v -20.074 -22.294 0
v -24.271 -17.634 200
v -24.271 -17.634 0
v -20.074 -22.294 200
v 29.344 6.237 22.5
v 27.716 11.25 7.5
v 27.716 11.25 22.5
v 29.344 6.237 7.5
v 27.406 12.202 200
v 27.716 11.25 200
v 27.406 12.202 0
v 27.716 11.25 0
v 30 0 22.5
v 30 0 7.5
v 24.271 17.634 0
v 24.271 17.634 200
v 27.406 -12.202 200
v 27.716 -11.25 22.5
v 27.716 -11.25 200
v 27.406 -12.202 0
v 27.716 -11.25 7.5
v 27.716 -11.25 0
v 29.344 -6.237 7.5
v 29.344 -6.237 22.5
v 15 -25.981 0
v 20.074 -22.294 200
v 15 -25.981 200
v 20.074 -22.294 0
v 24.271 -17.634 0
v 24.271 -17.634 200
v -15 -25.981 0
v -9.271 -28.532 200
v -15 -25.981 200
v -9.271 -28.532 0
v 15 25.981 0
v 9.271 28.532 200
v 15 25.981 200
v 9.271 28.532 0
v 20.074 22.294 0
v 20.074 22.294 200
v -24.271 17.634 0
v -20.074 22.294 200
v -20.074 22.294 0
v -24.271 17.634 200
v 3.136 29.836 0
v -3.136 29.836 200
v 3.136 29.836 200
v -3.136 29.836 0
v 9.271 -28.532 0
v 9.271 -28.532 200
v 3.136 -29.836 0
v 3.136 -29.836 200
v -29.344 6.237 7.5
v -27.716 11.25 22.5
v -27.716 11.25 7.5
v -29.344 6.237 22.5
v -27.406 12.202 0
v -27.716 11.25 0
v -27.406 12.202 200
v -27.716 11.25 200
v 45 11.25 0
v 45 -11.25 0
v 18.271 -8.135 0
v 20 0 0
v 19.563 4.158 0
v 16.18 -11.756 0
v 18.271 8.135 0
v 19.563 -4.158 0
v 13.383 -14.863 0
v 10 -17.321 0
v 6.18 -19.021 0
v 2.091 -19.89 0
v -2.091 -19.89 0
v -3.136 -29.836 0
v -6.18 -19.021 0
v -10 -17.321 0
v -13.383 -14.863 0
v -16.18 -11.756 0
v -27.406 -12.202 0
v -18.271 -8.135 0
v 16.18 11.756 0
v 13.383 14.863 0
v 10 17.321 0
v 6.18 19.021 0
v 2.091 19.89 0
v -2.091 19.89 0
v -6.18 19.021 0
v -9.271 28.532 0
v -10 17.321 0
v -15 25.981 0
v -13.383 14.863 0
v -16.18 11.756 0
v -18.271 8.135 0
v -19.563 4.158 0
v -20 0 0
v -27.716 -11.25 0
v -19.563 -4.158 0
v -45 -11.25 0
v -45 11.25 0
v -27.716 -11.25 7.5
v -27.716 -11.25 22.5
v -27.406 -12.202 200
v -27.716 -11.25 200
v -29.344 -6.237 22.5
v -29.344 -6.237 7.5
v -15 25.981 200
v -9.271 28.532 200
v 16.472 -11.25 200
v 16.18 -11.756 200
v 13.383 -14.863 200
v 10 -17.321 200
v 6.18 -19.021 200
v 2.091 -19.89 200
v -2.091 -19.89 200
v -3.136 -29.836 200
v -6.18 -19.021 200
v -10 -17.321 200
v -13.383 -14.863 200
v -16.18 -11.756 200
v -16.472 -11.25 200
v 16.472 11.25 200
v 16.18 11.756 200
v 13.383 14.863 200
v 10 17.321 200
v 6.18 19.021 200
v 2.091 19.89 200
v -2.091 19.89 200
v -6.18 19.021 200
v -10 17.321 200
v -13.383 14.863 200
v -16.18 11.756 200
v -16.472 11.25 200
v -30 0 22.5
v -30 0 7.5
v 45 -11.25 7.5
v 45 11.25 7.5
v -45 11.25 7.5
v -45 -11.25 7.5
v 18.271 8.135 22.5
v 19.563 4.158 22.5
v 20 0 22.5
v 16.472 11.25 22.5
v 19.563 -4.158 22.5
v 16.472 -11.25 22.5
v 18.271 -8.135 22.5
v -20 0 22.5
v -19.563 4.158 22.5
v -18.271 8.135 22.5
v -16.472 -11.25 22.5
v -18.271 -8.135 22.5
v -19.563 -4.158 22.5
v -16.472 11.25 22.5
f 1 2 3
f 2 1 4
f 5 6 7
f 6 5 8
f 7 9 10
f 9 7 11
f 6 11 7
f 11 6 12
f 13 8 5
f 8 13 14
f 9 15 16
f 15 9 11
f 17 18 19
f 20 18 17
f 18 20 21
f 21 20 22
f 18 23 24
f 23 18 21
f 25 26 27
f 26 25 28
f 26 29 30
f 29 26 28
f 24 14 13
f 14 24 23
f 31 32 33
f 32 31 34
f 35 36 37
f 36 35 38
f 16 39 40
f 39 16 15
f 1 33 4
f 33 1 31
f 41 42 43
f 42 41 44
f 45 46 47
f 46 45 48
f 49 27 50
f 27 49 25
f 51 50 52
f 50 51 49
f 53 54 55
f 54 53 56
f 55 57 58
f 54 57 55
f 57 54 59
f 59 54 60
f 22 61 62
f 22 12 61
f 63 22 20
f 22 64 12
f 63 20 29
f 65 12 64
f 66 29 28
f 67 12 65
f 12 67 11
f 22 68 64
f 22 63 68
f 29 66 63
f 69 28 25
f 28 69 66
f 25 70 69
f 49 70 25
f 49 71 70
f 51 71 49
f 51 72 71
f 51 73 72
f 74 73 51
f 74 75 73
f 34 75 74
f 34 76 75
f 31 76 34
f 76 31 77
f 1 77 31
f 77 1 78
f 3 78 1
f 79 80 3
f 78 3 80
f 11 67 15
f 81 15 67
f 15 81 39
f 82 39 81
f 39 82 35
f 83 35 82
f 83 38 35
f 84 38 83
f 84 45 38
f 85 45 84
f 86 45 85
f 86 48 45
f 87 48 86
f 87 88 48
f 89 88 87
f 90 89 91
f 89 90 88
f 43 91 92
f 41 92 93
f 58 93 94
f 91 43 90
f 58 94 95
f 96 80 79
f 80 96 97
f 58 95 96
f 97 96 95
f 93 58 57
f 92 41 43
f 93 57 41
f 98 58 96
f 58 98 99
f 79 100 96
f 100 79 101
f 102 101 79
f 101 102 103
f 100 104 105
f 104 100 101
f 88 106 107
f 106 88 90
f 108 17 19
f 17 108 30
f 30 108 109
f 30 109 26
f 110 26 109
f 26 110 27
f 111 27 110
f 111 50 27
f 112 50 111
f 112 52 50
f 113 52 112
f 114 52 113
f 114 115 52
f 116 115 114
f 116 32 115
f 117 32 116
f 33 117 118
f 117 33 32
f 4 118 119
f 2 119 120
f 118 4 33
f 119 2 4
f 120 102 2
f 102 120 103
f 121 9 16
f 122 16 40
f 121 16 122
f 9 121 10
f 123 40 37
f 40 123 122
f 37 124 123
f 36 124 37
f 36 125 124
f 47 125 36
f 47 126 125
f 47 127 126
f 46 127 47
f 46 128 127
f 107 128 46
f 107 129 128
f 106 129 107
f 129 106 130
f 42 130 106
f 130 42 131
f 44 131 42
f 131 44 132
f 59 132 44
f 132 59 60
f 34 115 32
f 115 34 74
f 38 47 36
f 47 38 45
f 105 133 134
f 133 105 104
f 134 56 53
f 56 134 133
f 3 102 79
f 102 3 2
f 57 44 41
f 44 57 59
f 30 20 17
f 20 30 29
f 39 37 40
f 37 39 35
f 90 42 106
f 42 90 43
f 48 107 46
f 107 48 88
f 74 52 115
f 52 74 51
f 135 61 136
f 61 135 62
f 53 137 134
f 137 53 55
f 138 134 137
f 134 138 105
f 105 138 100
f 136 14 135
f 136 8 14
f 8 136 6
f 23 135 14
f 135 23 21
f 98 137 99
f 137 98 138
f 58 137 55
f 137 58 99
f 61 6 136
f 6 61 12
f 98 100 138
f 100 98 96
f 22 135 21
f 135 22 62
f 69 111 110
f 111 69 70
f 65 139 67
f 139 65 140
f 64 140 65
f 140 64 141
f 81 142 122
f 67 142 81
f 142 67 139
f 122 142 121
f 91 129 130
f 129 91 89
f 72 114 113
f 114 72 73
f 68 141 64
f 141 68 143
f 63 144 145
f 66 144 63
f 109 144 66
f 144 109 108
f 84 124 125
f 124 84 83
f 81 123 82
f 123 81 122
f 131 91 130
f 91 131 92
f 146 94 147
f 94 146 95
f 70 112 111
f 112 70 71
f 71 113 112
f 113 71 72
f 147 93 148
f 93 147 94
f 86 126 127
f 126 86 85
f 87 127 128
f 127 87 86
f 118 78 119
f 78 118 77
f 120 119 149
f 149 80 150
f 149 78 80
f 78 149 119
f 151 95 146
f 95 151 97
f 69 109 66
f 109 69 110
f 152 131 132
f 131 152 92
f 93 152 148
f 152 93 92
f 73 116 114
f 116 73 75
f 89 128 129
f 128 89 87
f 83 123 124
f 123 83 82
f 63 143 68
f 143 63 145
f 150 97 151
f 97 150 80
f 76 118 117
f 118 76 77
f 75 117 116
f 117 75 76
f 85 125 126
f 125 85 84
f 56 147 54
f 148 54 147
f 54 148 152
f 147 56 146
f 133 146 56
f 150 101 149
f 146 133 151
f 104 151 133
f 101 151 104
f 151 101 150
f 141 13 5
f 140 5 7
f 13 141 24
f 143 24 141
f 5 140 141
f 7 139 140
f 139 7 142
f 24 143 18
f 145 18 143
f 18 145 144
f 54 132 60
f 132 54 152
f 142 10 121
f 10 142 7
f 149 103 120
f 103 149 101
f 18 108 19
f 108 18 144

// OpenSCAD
r = 30;
h = 200;
thickness = 10;

cubeLength = 3*r;
cubeWidth = .75*r;
cubeHeight = .25*r;

difference(){
    union(){
        cylinder(h, r,r);
        translate([-.5*cubeLength, -.5*cubeWidth, 0]){
            cube([cubeLength,cubeWidth,cubeHeight]);
        };
    };
    cylinder(h, r-thickness, r-thickness);
    translate([-r,-.5*cubeWidth, cubeWidth]){
        cube([2*r,cubeWidth,h]);
    };
};
    
